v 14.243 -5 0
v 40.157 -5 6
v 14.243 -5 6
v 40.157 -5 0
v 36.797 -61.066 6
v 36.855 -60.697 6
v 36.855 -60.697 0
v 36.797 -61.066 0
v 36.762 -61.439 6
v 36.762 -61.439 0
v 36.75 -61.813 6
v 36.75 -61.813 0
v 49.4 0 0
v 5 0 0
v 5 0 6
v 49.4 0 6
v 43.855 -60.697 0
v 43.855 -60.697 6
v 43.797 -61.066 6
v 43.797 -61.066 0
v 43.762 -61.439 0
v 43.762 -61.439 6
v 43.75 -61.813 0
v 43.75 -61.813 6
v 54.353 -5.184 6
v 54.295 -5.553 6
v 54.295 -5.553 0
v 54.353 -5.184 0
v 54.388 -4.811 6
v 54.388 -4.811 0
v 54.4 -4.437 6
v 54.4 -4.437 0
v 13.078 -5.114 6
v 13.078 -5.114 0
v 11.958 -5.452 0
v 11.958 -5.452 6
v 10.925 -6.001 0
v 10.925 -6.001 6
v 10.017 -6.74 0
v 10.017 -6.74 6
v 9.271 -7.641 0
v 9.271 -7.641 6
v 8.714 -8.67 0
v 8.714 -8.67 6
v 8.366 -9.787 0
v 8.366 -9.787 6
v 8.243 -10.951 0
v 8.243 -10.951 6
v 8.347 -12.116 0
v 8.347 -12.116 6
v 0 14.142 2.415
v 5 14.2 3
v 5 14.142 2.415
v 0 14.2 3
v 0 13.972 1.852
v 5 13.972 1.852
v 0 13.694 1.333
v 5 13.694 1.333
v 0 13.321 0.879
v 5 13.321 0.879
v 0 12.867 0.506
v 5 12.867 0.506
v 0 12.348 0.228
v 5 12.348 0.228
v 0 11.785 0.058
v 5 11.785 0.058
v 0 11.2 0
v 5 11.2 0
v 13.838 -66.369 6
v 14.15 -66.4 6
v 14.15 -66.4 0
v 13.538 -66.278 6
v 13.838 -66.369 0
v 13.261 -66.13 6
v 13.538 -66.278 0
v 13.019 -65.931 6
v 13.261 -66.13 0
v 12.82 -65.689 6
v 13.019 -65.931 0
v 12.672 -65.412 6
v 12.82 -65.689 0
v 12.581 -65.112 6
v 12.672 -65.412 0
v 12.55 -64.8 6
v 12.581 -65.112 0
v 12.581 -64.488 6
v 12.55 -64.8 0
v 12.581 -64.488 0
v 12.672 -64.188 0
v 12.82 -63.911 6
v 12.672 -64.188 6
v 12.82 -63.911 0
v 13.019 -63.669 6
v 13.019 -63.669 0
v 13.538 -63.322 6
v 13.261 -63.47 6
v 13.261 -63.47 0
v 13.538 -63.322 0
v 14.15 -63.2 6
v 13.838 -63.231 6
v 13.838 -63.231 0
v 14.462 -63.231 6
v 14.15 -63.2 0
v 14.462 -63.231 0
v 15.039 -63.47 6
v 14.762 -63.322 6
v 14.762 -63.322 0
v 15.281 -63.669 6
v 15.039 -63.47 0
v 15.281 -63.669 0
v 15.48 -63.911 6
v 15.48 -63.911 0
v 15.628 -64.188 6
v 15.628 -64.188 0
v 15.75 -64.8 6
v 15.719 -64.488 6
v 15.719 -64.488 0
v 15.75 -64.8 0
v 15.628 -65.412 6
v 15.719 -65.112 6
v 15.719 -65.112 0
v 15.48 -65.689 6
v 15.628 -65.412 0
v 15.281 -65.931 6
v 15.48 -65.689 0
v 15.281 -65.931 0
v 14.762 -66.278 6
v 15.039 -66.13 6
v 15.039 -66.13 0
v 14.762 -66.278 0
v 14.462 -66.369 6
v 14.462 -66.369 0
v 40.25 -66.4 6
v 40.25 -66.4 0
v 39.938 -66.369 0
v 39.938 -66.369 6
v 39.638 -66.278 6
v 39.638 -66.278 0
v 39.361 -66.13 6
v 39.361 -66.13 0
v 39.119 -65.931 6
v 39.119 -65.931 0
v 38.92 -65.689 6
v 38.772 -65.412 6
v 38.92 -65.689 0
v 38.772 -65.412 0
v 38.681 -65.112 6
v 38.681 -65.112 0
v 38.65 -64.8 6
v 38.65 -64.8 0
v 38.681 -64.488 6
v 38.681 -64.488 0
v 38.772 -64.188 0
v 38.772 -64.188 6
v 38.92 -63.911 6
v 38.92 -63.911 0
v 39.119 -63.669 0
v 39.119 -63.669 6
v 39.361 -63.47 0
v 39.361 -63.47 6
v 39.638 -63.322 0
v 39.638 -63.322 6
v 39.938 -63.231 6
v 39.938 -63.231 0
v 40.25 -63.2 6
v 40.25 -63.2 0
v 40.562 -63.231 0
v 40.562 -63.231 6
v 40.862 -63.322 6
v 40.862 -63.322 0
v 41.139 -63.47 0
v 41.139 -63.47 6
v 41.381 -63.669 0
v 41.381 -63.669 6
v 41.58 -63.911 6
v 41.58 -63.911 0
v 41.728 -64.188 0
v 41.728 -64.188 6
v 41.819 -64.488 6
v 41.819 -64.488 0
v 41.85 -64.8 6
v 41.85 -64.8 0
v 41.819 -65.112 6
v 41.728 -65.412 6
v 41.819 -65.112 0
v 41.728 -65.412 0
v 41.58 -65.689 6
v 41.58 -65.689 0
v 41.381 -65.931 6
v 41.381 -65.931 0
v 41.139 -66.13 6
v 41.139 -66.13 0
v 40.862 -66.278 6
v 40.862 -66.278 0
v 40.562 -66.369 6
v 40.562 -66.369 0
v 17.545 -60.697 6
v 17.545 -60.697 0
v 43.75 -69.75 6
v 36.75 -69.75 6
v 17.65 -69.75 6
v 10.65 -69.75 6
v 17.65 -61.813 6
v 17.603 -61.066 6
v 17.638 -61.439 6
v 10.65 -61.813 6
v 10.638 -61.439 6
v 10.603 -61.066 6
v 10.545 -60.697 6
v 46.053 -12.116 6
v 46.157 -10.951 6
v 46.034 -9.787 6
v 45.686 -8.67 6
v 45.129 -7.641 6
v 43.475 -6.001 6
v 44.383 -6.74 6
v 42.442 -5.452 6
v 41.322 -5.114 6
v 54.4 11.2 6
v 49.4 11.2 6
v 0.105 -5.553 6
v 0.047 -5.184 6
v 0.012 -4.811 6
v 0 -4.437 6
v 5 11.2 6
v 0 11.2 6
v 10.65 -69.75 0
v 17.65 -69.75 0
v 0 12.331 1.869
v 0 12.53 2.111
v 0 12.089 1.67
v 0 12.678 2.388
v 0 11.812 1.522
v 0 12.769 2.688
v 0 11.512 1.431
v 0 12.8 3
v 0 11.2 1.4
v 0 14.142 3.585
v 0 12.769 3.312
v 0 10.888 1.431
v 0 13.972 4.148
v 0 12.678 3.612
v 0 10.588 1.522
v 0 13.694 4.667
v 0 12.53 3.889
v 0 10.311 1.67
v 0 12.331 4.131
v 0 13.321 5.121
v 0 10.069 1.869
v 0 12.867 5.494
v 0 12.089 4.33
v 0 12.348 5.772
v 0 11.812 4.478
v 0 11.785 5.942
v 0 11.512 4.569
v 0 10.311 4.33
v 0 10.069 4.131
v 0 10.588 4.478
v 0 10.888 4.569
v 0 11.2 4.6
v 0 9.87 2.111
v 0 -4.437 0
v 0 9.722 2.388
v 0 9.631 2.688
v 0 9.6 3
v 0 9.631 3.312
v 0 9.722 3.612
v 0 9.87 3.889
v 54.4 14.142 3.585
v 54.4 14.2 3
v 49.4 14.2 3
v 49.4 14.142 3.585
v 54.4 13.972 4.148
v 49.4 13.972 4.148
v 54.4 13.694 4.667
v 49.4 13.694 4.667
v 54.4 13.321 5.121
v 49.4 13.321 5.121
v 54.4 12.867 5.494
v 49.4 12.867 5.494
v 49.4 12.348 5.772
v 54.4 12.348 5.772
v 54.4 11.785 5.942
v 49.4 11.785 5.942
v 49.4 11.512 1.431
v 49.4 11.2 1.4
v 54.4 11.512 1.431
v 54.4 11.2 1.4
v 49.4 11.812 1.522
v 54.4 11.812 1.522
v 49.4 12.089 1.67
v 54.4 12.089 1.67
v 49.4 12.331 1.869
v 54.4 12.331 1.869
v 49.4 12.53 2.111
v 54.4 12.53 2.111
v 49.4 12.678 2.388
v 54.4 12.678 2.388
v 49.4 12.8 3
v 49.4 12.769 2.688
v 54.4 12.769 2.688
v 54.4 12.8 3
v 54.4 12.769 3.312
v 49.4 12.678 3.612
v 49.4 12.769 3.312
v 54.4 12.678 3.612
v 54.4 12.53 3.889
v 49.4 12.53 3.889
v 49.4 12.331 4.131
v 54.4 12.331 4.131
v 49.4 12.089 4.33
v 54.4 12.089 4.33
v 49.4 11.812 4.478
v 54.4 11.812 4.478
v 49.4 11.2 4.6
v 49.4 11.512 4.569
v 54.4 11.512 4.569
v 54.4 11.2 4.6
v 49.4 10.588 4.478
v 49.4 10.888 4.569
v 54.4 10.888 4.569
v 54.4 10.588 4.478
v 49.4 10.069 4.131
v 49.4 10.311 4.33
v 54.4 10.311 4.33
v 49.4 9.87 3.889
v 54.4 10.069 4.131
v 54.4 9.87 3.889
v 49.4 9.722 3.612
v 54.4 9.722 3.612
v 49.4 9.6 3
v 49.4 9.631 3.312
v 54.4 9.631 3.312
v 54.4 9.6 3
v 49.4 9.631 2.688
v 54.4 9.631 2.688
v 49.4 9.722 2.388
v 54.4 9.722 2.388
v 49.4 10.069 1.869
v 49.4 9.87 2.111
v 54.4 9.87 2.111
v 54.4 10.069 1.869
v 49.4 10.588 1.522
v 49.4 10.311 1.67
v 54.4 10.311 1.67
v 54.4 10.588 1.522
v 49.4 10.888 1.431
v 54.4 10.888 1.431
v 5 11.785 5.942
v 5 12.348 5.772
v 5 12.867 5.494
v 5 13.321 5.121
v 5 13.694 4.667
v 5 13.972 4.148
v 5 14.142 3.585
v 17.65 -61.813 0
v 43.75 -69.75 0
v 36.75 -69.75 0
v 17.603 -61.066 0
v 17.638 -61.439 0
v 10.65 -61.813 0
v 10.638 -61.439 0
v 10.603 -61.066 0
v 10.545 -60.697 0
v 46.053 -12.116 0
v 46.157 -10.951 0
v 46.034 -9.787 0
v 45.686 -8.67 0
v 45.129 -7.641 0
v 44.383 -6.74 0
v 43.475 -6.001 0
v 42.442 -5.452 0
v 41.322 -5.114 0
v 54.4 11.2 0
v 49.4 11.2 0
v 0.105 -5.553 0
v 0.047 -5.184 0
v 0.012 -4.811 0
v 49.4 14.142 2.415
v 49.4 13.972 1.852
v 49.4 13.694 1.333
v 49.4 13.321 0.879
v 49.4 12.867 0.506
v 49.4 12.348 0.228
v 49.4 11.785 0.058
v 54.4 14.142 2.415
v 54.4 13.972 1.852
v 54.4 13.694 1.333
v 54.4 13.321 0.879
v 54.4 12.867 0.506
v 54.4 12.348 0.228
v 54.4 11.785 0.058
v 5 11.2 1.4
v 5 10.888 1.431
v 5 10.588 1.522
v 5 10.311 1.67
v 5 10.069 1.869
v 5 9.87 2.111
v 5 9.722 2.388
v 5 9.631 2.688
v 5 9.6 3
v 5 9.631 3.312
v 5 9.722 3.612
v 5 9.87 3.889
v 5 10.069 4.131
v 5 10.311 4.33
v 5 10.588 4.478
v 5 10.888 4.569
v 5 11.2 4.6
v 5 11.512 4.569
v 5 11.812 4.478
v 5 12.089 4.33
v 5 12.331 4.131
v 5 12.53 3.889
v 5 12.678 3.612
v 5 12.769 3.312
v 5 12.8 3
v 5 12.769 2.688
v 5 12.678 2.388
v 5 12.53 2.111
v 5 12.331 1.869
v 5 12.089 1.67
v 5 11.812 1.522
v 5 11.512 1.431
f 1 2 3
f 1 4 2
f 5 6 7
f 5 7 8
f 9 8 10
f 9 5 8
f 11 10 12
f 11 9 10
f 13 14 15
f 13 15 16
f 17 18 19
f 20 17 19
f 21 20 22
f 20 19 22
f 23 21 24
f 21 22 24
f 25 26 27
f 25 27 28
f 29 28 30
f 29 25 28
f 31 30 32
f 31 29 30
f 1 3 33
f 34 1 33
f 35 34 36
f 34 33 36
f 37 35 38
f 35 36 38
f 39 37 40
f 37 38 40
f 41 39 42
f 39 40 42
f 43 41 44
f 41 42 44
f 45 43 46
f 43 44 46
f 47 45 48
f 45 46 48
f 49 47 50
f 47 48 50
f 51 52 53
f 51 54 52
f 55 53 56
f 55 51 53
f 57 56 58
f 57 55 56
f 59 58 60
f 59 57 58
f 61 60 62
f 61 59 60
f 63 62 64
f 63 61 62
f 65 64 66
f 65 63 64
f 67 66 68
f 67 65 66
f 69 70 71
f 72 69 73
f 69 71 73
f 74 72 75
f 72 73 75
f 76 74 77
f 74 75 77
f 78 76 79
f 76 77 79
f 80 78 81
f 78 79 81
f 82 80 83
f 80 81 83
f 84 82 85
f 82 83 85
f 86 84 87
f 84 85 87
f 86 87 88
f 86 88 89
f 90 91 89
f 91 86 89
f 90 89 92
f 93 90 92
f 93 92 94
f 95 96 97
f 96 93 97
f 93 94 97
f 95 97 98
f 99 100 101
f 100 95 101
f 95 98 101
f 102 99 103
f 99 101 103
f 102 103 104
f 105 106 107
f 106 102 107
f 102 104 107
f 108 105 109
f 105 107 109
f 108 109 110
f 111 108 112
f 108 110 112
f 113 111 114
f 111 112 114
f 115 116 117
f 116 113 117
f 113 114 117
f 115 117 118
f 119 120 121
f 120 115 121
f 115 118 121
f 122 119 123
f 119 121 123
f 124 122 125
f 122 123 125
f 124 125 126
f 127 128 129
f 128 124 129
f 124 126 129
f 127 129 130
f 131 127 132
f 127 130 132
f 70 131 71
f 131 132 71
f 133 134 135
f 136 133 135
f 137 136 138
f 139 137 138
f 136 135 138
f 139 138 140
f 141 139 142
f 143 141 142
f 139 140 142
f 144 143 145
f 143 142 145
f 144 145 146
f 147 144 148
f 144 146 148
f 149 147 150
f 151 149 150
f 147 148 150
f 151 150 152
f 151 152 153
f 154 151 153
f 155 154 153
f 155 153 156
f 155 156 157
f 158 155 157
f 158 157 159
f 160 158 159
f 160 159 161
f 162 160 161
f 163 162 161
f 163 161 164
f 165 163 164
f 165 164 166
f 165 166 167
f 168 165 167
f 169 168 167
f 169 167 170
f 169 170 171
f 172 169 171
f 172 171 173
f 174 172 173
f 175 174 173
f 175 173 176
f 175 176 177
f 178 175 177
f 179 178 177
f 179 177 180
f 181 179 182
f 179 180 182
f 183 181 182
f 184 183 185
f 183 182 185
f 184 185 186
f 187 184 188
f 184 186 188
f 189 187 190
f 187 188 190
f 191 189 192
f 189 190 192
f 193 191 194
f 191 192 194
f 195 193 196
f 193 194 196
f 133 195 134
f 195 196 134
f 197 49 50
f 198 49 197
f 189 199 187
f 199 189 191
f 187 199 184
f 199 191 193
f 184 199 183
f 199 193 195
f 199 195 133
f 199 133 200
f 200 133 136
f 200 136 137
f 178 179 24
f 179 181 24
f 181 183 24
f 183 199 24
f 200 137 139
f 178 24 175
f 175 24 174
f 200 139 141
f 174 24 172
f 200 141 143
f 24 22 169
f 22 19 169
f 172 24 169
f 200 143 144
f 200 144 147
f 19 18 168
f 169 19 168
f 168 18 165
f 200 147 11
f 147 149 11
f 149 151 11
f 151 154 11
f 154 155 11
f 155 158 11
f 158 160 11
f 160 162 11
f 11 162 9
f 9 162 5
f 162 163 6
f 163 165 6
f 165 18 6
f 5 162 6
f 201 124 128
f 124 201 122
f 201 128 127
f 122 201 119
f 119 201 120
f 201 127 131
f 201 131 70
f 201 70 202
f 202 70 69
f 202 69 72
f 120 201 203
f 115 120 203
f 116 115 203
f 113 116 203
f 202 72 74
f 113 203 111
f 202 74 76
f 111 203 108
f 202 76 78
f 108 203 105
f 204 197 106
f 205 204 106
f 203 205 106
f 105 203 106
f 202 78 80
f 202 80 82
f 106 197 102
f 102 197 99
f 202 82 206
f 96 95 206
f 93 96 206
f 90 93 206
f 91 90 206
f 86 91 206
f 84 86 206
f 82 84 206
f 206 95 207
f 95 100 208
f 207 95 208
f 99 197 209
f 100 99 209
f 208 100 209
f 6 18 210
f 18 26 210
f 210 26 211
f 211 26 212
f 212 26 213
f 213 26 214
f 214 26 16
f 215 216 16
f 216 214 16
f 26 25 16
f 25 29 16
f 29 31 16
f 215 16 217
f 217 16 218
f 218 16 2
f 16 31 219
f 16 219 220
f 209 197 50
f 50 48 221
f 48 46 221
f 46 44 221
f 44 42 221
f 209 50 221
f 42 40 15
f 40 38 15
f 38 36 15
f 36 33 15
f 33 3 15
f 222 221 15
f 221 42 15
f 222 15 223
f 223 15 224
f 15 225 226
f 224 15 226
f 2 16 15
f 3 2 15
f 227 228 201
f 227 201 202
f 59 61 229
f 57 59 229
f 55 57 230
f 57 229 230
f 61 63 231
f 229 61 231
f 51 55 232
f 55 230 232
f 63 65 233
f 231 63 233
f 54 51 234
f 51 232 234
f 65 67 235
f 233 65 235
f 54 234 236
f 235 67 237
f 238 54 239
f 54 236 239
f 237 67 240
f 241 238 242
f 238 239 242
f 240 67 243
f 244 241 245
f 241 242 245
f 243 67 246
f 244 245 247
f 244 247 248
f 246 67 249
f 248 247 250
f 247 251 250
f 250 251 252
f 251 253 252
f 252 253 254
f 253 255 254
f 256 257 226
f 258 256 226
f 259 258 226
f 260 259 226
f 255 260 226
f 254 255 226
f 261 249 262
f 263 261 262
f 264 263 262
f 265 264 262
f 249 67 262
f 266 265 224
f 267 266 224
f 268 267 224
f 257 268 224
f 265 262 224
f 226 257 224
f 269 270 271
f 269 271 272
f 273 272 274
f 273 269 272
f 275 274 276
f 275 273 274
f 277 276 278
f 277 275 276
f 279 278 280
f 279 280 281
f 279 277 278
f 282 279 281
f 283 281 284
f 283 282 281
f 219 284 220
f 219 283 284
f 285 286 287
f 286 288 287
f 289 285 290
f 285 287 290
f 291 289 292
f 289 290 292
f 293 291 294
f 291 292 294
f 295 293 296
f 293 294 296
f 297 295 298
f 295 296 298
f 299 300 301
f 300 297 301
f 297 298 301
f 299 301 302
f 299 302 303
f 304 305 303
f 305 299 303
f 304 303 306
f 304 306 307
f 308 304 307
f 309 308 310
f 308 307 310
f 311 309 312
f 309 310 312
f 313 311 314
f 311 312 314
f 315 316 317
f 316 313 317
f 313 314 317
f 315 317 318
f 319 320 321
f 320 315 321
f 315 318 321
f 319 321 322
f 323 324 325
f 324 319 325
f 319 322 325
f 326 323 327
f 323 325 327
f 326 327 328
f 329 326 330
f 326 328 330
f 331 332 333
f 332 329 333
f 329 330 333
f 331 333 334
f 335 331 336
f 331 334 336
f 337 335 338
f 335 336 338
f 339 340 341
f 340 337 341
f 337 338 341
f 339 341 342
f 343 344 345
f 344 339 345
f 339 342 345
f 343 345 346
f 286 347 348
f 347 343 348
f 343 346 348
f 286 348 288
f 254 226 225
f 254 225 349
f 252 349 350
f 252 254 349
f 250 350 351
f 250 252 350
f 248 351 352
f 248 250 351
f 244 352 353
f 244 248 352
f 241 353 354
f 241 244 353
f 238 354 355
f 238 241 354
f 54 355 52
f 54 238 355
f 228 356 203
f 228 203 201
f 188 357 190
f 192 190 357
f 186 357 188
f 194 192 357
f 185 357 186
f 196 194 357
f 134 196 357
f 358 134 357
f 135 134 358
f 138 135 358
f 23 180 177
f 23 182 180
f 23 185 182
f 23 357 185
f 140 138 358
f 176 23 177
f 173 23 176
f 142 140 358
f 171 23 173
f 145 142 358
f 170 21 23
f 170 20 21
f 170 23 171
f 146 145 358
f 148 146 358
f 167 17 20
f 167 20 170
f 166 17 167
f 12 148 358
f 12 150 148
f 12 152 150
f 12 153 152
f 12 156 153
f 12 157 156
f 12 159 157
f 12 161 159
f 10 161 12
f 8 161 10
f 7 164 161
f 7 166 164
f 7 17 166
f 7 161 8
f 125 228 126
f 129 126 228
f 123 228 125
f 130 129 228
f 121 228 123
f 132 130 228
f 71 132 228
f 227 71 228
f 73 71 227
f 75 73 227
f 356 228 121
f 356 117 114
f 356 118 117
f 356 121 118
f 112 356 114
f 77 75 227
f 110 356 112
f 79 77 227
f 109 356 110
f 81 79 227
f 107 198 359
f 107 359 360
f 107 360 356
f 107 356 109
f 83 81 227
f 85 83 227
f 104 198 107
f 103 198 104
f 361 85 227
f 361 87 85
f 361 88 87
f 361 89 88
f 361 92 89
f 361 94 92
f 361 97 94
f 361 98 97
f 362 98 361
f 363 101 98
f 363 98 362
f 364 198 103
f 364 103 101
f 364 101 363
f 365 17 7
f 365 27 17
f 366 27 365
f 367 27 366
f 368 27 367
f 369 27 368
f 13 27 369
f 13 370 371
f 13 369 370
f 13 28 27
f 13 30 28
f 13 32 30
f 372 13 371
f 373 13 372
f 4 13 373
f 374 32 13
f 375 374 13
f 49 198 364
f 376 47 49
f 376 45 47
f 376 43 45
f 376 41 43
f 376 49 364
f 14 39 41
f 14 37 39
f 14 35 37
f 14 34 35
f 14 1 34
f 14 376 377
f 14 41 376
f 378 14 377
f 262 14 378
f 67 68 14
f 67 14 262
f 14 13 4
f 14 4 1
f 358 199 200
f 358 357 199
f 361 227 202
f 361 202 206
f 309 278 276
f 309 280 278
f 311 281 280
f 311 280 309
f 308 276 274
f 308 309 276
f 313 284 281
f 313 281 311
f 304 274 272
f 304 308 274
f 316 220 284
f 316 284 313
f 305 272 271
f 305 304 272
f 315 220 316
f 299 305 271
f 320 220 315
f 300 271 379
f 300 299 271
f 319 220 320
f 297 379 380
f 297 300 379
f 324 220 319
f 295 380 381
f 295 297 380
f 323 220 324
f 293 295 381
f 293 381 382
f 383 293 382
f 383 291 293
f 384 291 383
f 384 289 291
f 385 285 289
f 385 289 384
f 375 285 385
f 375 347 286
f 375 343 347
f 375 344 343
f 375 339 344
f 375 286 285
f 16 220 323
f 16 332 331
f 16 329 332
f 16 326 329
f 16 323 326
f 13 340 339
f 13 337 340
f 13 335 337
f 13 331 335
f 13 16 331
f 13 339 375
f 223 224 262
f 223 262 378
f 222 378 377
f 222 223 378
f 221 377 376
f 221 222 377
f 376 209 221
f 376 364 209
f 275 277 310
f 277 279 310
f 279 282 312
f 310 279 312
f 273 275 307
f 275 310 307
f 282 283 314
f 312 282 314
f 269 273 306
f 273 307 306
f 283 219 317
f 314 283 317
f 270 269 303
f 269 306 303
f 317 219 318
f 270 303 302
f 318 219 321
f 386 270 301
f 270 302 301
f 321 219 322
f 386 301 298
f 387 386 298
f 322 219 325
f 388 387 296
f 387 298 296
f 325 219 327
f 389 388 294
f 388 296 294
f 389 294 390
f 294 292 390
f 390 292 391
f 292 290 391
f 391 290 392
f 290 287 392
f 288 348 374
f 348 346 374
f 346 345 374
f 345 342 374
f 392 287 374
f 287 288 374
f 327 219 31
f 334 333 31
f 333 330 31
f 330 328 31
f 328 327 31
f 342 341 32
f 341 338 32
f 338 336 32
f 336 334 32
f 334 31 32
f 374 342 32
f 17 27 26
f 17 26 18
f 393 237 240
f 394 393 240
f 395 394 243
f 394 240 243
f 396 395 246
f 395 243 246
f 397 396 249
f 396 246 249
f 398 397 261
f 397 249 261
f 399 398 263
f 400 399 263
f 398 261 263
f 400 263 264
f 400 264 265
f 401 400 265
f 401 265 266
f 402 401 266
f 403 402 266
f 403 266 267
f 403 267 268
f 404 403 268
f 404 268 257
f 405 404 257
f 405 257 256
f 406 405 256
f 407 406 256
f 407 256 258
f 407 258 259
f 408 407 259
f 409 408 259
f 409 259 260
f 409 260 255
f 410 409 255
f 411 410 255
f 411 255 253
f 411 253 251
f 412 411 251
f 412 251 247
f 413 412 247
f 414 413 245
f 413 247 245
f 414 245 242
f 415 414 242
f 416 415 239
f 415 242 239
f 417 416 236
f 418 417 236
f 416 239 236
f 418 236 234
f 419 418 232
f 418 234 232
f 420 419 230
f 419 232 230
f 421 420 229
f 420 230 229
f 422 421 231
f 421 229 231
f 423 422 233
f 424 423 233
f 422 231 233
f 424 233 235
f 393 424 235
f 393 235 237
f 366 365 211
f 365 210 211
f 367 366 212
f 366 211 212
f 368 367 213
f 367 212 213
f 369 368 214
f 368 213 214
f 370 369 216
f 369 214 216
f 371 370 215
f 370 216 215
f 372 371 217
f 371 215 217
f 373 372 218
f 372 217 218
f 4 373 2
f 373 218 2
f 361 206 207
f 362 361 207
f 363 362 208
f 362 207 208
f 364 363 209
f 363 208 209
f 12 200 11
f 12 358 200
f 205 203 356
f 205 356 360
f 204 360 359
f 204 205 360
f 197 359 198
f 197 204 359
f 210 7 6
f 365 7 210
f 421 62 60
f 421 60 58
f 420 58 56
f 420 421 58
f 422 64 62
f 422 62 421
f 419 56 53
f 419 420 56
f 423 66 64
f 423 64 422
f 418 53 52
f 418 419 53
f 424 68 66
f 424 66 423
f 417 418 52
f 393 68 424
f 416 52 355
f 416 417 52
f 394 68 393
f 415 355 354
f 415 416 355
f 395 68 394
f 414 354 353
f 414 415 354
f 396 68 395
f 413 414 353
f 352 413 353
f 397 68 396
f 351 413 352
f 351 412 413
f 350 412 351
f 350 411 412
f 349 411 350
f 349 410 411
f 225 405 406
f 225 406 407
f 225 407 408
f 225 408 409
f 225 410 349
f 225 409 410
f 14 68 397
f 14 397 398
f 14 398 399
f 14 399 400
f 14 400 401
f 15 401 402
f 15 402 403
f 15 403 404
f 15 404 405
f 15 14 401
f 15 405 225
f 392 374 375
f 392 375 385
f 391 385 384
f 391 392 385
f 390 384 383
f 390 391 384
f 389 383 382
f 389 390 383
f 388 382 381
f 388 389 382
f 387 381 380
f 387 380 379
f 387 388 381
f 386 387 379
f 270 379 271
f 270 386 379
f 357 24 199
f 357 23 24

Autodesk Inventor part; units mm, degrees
ref_plane "YZ Plane" through (0, 0, 0) normal (1, 0, 0) x (0, 1, 0)
ref_plane "XZ Plane" through (0, 0, 0) normal (0, 1, 0) x (-1, 0, 0)
sketch "Эскиз1" plane through (0, 0, 0) normal (0, 0, 1) x (1, 0, 0)
  line L0 (0, 0) -> (5, 0)
  line L1 (5, 0) -> (5, 7)
  line L2 (5, 7) -> (0, 7)
  line L3 (0, 7) -> (0, 0)
  line L4 (0, 0) -> (27.2, 0)
  line L5 (27.2, 0) -> (27.2, -5)
  line L6 (27.2, -5) -> (0, -5)
  line L7 (0, -5) -> (0, 0)
  dimension "d0" = 5
  dimension "d1" = 7
  dimension "d2" = 27.2
  dimension "d3" = 5
extrude "Выдавливание1" add sketch "Эскиз1" along normal blind 6
sketch "Эскиз4" plane through (0, 7, 0) normal (0, 1, 0) x (1, 0, 0)
  line L0 (0, 0) -> (0, -6) projected
  line L1 (0, 0) -> (0, -6) projected
  line L2 (5, 0) -> (0, 0) projected
  line L3 (0, 0) -> (0, -6) projected
  line L4 (5, -6) -> (0, -6) projected
  line L5 (5, 0) -> (5, -6) projected
  point P0 (0, -6)
  point P1 (0, 0)
extrude "Выдавливание2" add sketch "Эскиз4" along normal blind 7.2
fillet "Сопряжение1" radius 3 2 edges at (2.5, 14.2, 6) (2.5, 14.2, 0)
sketch "Эскиз5" plane through (5, 0, 6) normal (1, 0, 0) x (0, 0, -1)
  line L0 (0, -5) -> (0, -5) projected
  arc A0 (6, 11.2) -> (0, 11.2) centre (3, 11.2) ccw projected
  point P0 (6, 0)
  point P1 (6, -5)
  point P2 (2.5, 25.2)
hole "Отверстие2" at (5, 11.2, 3) direction (-1, 0, 0) diameter 3.2 depth 5
mirror "Зеркальное отражение1" about plane through (27.2, -5, 0) normal (1, 0, 0)
sketch "Эскиз9" plane through (0, 0, 0) normal (0, 0, -1) x (-1, 0, 0)
  line L0 (0, -5) -> (-54.4, -5) projected
  line L1 (-54.4, 11.2) -> (-54.4, -5) projected
  line L2 (-54.4, -5) -> (-43.75, -61.25)
  line L3 (-43.75, -61.25) -> (-43.75, -69.75)
  line L4 (-43.75, -69.75) -> (-36.75, -69.75)
  line L5 (-36.75, -69.75) -> (-36.75, -61.25)
  line L6 (-36.75, -61.25) -> (-47.4, -5)
  point P0 (0, 0)
  dimension "d82" = 64.75
  dimension "d83" = 7
  dimension "d86" = 8.5
  dimension "d95" = 10.65
extrude "Выдавливание4" add sketch "Эскиз9" against normal blind 6
sketch "Эскиз11" plane through (0, 0, 6) normal (0, 0, 1) x (1, 0, 0)
  line L0 (40.25, -69.75) -> (40.25, -64.8)
  line L1 (36.75, -69.75) -> (43.75, -69.75) projected
  point P0 (0, 0)
  dimension "d91" = 4.95
hole "Отверстие6" at (40.25, -64.8, 6) direction (0, 0, -1) diameter 3.2 end through all
ref_plane "РабПлоскость1" through (27.2, 11.2, 3) normal (1, 0, 0) x (0, 0, -1)
mirror "Зеркальное отражение2" about plane through (27.2, 11.2, 3) normal (1, 0, 0) of "Выдавливание4", "Отверстие6"
fillet "Сопряжение3" radius 6 8 edges at (43.75, -61.25, 3) (36.75, -61.25, 3) (17.65, -61.25, 3) (10.65, -61.25, 3) (0, -5, 3) (7, -5, 3) (47.4, -5, 3) (54.4, -5, 3)
equation "\"Радиус_гибки\" = Толщина"
equation "\"Ширина_просечки\" = Толщина"
equation "\"Глубина_просечки\" = 0.5 * Толщина"
equation "\"Размер_просечки\" = 4 * Толщина"
equation "\"Мин_остаток\" = 2 * Толщина"
equation "\"Радиус_перехода\" = Радиус_гибки"
equation "\"Радиус_Якоби\" = Толщина"
equation "\"Размер_зазора\" = Толщина"
equation "\"Толщина\" = 0.5"
properties part number "Стойка для камеры"
